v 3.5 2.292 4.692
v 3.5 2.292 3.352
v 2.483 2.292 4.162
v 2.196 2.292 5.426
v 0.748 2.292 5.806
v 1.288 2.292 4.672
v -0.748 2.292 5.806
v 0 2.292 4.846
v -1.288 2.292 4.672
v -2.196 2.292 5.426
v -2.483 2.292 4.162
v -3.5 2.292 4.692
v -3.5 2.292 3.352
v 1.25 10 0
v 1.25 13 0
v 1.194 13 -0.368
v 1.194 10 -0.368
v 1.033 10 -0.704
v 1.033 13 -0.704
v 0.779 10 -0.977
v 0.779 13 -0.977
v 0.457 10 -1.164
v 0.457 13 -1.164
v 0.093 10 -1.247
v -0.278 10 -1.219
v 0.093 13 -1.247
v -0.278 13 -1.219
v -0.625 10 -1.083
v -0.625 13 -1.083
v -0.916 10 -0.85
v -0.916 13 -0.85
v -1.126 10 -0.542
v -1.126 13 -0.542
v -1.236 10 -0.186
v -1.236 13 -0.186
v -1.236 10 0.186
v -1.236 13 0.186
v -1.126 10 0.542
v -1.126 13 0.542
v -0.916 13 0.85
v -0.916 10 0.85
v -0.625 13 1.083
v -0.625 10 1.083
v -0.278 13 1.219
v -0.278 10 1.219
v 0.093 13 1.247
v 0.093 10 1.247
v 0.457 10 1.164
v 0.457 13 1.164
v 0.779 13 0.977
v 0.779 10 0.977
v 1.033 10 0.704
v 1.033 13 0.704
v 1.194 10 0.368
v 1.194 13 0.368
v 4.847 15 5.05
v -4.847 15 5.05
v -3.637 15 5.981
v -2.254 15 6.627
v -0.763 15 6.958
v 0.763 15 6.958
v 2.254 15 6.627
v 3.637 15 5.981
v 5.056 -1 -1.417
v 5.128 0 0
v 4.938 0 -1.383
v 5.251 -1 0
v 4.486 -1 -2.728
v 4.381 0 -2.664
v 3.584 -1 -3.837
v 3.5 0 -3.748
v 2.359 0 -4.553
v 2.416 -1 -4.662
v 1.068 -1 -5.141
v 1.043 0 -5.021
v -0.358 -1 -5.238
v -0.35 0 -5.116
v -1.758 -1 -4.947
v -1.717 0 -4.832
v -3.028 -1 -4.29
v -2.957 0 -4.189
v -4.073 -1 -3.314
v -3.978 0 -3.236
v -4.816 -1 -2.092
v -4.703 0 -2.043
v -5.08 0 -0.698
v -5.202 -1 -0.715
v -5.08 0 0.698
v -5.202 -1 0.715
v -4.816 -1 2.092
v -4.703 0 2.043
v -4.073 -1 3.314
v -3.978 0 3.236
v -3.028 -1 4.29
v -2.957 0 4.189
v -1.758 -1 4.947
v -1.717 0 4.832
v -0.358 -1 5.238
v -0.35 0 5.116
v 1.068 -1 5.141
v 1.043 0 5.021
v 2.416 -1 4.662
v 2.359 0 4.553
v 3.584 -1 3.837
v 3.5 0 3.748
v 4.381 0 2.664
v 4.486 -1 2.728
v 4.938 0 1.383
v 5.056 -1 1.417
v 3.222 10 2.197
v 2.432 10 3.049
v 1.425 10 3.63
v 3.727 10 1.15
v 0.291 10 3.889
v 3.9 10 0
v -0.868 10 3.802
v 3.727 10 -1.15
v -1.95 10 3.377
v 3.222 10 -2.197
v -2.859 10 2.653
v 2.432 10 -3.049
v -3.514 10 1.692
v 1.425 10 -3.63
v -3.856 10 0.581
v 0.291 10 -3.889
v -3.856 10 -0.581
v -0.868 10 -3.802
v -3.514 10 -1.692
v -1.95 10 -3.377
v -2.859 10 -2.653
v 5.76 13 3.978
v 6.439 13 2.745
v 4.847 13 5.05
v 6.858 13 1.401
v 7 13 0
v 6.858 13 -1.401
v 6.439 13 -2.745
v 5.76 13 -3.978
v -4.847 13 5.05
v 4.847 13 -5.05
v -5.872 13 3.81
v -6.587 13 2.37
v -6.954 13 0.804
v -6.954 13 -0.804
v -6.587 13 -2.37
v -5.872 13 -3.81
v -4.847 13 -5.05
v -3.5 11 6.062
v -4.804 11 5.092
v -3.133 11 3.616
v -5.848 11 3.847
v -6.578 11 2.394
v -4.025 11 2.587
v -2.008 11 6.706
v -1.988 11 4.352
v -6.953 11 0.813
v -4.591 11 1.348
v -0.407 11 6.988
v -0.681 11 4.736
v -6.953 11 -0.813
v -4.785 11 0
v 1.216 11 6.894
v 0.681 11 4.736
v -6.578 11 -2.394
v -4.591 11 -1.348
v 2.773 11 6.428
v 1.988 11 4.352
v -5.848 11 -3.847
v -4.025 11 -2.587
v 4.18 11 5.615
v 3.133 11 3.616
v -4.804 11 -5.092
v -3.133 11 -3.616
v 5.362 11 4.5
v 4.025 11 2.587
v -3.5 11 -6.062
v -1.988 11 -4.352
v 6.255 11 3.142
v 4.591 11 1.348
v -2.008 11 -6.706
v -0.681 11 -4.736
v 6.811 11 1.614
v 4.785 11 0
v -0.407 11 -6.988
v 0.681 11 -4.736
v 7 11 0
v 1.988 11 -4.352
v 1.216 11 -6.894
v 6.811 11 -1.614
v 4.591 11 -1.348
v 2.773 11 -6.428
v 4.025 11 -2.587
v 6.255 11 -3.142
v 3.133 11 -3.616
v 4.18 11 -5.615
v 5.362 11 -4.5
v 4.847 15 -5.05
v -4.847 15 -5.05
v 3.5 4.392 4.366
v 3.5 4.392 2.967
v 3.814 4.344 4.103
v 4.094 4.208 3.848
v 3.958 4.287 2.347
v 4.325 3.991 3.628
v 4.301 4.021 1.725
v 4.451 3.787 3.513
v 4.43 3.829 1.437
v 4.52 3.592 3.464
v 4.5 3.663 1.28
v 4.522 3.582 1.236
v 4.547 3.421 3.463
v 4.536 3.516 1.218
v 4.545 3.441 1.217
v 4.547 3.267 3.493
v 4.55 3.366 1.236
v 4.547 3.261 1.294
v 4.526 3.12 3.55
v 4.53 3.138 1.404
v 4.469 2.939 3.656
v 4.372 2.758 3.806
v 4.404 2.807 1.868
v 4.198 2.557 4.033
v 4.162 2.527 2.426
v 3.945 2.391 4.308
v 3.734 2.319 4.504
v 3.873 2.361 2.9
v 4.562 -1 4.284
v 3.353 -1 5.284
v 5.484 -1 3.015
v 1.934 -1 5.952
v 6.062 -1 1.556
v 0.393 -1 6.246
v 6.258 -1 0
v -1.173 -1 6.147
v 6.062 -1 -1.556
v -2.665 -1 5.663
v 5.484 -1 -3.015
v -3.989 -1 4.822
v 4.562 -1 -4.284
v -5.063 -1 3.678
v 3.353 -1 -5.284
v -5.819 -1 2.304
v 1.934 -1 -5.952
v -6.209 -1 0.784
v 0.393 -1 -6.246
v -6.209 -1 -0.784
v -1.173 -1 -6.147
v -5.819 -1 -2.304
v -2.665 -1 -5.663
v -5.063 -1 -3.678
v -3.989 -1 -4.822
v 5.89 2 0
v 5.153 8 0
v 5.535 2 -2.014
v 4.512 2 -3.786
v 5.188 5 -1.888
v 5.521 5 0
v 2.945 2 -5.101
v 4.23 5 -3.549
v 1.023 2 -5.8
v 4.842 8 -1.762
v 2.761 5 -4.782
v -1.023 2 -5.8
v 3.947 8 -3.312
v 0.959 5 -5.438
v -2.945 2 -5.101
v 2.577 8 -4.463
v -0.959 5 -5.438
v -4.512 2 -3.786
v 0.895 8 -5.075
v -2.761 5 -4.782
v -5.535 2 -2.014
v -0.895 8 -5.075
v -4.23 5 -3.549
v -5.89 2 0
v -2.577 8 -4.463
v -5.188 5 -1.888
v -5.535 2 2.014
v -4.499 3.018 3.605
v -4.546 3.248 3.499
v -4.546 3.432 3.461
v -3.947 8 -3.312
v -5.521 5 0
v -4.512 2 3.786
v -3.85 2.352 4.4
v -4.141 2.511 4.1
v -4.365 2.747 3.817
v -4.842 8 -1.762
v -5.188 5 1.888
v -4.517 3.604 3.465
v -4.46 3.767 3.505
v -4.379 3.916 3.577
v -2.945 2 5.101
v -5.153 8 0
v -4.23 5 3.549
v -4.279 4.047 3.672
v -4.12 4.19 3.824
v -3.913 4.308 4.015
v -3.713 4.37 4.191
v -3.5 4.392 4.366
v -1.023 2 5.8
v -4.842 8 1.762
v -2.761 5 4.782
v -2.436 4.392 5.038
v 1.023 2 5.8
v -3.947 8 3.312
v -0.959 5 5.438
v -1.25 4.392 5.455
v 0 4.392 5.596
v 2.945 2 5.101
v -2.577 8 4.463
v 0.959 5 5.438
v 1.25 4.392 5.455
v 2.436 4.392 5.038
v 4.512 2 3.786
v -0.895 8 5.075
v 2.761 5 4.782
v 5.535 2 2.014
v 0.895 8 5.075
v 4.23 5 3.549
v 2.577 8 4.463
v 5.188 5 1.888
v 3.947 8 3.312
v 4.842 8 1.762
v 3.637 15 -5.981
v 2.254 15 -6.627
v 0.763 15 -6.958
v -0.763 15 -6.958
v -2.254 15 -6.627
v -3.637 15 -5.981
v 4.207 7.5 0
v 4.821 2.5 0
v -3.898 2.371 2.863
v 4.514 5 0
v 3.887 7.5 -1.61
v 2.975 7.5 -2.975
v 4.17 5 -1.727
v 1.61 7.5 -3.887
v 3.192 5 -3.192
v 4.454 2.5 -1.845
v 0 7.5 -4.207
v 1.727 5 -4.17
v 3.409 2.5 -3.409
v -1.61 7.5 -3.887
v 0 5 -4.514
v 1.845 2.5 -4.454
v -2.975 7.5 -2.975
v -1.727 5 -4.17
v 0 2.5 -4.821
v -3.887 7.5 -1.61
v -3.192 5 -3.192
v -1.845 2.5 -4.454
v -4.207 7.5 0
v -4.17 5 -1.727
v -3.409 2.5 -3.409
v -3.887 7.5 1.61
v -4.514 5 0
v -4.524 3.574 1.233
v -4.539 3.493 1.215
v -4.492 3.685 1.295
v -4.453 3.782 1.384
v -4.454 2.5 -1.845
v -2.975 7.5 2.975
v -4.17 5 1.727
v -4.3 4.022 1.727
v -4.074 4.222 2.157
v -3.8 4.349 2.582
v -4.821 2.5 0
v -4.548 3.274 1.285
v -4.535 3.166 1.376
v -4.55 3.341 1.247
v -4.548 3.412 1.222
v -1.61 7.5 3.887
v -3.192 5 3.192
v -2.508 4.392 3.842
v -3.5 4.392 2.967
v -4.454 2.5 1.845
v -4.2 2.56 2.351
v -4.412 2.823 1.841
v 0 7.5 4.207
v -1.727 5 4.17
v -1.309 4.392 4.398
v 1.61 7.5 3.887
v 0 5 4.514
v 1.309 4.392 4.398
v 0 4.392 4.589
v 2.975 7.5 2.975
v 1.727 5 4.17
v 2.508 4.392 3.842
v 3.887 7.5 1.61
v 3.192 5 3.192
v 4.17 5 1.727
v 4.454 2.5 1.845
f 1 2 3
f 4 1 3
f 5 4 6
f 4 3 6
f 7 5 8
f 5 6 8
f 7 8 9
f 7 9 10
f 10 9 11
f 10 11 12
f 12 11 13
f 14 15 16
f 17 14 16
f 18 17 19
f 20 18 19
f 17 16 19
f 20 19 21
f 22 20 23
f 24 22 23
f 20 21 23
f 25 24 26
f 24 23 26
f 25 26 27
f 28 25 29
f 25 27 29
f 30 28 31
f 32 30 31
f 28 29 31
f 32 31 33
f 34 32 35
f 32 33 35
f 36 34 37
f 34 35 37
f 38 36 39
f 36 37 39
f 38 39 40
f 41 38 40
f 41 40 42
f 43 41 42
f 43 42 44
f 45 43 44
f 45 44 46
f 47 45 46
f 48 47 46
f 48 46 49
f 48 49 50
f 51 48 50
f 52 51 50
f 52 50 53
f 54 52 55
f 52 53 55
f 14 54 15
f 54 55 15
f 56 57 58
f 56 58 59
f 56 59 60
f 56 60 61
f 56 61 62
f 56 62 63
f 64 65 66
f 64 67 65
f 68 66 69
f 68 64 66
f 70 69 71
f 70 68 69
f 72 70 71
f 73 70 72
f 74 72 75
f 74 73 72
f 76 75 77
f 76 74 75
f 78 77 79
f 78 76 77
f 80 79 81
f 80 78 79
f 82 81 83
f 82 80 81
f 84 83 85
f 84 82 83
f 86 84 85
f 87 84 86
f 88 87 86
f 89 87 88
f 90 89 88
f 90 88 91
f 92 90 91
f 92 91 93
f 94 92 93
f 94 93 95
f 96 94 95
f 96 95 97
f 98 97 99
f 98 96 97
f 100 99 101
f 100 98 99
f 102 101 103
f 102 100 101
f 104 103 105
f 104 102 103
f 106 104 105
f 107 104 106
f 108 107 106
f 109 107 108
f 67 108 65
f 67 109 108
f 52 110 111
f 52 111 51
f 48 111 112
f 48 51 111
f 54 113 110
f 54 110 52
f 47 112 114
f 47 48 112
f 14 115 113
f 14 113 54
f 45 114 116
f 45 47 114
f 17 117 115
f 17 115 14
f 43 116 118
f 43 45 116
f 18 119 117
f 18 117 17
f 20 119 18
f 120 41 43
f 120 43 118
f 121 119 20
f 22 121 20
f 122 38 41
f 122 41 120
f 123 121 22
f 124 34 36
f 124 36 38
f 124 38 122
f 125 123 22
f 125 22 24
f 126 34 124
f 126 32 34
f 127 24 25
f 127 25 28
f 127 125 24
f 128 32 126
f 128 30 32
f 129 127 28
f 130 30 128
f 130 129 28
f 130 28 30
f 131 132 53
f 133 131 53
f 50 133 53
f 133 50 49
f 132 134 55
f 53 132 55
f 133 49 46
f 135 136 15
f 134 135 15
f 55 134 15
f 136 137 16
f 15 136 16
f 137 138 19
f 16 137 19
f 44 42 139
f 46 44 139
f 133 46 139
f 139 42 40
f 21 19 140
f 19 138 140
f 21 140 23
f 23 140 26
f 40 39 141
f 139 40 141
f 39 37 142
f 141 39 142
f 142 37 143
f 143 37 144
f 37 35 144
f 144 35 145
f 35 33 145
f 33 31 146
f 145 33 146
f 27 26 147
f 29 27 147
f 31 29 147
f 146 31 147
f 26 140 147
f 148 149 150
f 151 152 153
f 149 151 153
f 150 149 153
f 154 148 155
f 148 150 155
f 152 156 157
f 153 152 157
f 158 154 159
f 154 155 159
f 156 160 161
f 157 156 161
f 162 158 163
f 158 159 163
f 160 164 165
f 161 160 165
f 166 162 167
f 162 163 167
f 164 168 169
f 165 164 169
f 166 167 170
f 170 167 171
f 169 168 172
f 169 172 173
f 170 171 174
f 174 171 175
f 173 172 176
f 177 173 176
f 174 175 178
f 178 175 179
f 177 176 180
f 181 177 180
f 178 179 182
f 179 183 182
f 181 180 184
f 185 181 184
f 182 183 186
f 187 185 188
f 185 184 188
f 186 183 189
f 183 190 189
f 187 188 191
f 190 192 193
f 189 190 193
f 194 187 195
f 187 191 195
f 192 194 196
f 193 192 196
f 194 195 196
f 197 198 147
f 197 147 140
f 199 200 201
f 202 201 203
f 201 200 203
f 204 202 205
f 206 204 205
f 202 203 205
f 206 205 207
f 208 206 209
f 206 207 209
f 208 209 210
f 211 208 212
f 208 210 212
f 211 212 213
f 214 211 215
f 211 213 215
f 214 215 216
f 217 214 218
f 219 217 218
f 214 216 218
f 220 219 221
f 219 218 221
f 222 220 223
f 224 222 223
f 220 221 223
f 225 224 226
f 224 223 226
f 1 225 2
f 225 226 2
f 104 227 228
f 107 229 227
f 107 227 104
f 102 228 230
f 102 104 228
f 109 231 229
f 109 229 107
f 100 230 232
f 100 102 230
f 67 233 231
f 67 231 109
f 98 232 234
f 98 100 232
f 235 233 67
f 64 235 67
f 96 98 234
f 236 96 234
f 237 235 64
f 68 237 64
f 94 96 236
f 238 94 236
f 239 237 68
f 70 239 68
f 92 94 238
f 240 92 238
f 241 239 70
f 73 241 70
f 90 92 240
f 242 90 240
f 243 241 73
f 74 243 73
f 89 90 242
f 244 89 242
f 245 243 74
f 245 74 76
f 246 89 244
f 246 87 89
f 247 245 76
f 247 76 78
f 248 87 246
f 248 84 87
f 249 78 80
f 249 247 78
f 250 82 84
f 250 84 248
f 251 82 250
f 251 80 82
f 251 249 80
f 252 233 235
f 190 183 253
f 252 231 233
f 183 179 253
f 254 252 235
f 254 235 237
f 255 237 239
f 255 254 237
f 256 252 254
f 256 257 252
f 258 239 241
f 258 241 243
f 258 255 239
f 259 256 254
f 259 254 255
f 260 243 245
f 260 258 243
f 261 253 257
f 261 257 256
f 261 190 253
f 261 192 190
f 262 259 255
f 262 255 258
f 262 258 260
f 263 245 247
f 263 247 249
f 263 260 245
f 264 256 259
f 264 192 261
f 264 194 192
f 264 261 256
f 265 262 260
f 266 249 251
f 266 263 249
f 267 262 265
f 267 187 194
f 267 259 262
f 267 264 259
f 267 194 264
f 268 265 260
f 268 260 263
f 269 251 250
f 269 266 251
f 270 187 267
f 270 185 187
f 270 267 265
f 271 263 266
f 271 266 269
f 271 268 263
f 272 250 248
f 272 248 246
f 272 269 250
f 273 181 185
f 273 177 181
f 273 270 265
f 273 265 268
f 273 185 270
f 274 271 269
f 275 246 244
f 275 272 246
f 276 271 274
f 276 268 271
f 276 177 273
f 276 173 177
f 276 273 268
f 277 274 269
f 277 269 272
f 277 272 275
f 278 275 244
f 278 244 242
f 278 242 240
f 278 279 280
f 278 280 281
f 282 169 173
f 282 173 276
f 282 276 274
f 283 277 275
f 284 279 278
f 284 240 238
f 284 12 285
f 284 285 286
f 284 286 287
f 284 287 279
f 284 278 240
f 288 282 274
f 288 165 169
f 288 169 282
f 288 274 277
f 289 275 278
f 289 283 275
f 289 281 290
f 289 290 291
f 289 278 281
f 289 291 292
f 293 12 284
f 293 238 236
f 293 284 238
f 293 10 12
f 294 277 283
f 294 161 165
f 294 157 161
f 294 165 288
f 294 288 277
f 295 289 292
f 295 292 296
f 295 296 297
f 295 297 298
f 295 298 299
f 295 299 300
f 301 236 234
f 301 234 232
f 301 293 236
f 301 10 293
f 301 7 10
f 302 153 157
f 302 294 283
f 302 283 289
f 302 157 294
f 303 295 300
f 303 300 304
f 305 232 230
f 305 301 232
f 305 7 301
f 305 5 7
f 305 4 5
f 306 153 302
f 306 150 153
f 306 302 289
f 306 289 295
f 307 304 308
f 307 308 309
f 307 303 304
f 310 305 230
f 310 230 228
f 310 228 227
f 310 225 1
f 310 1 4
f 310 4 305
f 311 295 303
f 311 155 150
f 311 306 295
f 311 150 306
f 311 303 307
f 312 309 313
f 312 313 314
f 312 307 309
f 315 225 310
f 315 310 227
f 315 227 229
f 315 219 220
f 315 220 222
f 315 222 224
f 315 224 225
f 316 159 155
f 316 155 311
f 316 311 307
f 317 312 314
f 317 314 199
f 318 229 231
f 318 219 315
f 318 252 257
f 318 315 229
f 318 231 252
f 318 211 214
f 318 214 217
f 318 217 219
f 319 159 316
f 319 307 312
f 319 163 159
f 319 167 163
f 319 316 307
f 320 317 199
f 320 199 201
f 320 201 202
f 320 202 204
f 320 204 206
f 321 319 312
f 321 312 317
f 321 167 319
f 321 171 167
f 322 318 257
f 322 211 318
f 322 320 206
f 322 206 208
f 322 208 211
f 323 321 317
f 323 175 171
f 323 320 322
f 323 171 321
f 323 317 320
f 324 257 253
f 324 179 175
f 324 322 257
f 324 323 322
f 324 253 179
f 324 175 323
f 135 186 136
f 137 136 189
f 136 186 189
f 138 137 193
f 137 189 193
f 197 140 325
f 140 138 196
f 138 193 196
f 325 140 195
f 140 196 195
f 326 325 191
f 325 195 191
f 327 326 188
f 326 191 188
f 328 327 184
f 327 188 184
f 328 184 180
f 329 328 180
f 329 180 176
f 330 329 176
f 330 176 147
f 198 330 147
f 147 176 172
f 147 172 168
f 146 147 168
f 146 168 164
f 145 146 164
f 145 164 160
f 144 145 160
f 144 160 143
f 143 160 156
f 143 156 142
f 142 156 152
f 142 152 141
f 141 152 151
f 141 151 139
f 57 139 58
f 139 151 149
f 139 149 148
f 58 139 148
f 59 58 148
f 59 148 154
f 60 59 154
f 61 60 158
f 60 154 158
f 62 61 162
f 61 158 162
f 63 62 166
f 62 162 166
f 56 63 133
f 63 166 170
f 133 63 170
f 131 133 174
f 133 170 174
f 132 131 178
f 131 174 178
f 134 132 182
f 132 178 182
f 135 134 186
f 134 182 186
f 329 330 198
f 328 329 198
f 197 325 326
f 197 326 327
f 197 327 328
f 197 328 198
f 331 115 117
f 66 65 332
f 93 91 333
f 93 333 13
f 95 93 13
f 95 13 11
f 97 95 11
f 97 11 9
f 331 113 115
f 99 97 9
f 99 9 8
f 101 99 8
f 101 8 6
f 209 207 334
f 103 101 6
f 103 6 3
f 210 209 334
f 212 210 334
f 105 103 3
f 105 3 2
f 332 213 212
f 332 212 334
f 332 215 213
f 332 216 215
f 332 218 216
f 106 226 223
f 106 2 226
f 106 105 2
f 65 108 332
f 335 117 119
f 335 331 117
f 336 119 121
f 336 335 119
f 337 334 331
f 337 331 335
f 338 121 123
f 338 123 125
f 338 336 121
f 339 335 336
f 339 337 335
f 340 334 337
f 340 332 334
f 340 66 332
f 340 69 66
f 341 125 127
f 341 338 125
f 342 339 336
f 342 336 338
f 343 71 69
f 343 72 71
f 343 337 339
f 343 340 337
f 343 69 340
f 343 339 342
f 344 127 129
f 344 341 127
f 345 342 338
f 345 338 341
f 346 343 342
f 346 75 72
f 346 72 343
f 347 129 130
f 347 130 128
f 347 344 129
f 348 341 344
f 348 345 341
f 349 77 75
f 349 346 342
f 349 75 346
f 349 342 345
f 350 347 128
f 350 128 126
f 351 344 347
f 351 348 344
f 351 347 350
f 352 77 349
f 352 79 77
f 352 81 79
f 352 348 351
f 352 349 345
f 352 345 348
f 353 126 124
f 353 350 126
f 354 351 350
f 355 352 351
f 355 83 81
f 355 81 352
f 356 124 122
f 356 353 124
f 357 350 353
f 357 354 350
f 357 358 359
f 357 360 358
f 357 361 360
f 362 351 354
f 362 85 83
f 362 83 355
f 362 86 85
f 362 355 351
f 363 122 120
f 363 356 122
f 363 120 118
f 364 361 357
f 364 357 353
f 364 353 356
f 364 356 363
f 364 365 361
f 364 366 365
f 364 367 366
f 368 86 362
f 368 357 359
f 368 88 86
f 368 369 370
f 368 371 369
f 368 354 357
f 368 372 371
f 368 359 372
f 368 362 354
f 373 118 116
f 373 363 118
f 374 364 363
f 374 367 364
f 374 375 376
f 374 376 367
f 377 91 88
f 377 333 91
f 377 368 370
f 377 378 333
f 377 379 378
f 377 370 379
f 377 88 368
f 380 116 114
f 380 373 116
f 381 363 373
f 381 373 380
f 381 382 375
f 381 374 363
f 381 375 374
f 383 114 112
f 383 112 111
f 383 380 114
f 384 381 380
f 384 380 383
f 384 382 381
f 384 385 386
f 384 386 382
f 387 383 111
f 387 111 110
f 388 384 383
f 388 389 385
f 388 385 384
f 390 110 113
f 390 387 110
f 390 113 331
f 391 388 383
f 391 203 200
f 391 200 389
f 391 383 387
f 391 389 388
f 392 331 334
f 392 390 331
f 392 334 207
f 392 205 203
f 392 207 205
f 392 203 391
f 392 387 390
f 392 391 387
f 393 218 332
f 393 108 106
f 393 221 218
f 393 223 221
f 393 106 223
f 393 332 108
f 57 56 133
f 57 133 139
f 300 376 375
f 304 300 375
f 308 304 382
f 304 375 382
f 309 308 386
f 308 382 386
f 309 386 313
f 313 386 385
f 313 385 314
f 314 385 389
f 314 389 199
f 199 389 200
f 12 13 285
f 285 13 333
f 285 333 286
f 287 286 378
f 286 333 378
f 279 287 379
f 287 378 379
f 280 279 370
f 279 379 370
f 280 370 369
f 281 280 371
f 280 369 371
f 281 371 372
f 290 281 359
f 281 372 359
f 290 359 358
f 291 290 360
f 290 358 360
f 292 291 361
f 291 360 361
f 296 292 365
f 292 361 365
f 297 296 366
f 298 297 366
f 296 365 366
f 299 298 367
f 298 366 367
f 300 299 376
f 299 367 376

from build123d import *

# Parameters (mm, degrees)
SKETCH3_R           = 7
BOSS_EXTRUDE1_DEPTH = 4
CUT_EXTRUDE1_DEPTH  = 2
SKETCH7_R           = 1.25
CUT_EXTRUDE2_DEPTH  = 3
CUT_EXTRUDE3_DEPTH  = 10


with BuildPart() as part:
    # Sketch1 → Revolve1 (revolve)
    with BuildSketch(Plane.XY):
        Polygon((0, 10), (3.9, 10), (5.127845609, 0), (5.25063017, -1), (6.258139995, -1), (4.784725265, 11), (0, 11), align=None)
    revolve(axis=Axis((0, 10, 0), (0, 1, 0)))

    # Sketch3 → Boss-Extrude1 (add)
    with BuildSketch(Plane(origin=(0, 11, 0), x_dir=(1, 0, 0), z_dir=(0, 1, 0))):
        Circle(SKETCH3_R)
    extrude(amount=BOSS_EXTRUDE1_DEPTH)

    # Sketch5 → Cut-Extrude1 (cut)
    with BuildSketch(Plane(origin=(0, 15, 0), x_dir=(1, 0, 0), z_dir=(0, 1, 0))):
        with BuildLine():
            Line((-4.847421995, 5.05), (4.847421995, 5.05))
            ThreePointArc((4.847421995, 5.05), (7, 0), (4.847421995, -5.05))
            Line((4.847421995, -5.05), (-4.847421995, -5.05))
            ThreePointArc((-4.847421995, -5.05), (-7, 0), (-4.847421995, 5.05))
        make_face()
    extrude(amount=-CUT_EXTRUDE1_DEPTH, mode=Mode.SUBTRACT)

    # Sketch7 → Cut-Extrude2 (cut)
    with BuildSketch(Plane(origin=(0, 13, 0), x_dir=(1, 0, 0), z_dir=(0, 1, 0))):
        Circle(SKETCH7_R)
    extrude(amount=-CUT_EXTRUDE2_DEPTH, mode=Mode.SUBTRACT)

    # Sketch8 → Cut-Extrude3 (cut)
    with BuildSketch(Plane.XY):
        with BuildLine():
            Line((-3.5, 4.392195616), (3.5, 4.392195616))
            ThreePointArc((3.5, 4.392195616), (4.55, 3.342195616), (3.5, 2.292195616))
            Line((3.5, 2.292195616), (-3.5, 2.292195616))
            ThreePointArc((-3.5, 2.292195616), (-4.55, 3.342195616), (-3.5, 4.392195616))
        make_face()
    extrude(amount=CUT_EXTRUDE3_DEPTH, mode=Mode.SUBTRACT)


solid = part.part
